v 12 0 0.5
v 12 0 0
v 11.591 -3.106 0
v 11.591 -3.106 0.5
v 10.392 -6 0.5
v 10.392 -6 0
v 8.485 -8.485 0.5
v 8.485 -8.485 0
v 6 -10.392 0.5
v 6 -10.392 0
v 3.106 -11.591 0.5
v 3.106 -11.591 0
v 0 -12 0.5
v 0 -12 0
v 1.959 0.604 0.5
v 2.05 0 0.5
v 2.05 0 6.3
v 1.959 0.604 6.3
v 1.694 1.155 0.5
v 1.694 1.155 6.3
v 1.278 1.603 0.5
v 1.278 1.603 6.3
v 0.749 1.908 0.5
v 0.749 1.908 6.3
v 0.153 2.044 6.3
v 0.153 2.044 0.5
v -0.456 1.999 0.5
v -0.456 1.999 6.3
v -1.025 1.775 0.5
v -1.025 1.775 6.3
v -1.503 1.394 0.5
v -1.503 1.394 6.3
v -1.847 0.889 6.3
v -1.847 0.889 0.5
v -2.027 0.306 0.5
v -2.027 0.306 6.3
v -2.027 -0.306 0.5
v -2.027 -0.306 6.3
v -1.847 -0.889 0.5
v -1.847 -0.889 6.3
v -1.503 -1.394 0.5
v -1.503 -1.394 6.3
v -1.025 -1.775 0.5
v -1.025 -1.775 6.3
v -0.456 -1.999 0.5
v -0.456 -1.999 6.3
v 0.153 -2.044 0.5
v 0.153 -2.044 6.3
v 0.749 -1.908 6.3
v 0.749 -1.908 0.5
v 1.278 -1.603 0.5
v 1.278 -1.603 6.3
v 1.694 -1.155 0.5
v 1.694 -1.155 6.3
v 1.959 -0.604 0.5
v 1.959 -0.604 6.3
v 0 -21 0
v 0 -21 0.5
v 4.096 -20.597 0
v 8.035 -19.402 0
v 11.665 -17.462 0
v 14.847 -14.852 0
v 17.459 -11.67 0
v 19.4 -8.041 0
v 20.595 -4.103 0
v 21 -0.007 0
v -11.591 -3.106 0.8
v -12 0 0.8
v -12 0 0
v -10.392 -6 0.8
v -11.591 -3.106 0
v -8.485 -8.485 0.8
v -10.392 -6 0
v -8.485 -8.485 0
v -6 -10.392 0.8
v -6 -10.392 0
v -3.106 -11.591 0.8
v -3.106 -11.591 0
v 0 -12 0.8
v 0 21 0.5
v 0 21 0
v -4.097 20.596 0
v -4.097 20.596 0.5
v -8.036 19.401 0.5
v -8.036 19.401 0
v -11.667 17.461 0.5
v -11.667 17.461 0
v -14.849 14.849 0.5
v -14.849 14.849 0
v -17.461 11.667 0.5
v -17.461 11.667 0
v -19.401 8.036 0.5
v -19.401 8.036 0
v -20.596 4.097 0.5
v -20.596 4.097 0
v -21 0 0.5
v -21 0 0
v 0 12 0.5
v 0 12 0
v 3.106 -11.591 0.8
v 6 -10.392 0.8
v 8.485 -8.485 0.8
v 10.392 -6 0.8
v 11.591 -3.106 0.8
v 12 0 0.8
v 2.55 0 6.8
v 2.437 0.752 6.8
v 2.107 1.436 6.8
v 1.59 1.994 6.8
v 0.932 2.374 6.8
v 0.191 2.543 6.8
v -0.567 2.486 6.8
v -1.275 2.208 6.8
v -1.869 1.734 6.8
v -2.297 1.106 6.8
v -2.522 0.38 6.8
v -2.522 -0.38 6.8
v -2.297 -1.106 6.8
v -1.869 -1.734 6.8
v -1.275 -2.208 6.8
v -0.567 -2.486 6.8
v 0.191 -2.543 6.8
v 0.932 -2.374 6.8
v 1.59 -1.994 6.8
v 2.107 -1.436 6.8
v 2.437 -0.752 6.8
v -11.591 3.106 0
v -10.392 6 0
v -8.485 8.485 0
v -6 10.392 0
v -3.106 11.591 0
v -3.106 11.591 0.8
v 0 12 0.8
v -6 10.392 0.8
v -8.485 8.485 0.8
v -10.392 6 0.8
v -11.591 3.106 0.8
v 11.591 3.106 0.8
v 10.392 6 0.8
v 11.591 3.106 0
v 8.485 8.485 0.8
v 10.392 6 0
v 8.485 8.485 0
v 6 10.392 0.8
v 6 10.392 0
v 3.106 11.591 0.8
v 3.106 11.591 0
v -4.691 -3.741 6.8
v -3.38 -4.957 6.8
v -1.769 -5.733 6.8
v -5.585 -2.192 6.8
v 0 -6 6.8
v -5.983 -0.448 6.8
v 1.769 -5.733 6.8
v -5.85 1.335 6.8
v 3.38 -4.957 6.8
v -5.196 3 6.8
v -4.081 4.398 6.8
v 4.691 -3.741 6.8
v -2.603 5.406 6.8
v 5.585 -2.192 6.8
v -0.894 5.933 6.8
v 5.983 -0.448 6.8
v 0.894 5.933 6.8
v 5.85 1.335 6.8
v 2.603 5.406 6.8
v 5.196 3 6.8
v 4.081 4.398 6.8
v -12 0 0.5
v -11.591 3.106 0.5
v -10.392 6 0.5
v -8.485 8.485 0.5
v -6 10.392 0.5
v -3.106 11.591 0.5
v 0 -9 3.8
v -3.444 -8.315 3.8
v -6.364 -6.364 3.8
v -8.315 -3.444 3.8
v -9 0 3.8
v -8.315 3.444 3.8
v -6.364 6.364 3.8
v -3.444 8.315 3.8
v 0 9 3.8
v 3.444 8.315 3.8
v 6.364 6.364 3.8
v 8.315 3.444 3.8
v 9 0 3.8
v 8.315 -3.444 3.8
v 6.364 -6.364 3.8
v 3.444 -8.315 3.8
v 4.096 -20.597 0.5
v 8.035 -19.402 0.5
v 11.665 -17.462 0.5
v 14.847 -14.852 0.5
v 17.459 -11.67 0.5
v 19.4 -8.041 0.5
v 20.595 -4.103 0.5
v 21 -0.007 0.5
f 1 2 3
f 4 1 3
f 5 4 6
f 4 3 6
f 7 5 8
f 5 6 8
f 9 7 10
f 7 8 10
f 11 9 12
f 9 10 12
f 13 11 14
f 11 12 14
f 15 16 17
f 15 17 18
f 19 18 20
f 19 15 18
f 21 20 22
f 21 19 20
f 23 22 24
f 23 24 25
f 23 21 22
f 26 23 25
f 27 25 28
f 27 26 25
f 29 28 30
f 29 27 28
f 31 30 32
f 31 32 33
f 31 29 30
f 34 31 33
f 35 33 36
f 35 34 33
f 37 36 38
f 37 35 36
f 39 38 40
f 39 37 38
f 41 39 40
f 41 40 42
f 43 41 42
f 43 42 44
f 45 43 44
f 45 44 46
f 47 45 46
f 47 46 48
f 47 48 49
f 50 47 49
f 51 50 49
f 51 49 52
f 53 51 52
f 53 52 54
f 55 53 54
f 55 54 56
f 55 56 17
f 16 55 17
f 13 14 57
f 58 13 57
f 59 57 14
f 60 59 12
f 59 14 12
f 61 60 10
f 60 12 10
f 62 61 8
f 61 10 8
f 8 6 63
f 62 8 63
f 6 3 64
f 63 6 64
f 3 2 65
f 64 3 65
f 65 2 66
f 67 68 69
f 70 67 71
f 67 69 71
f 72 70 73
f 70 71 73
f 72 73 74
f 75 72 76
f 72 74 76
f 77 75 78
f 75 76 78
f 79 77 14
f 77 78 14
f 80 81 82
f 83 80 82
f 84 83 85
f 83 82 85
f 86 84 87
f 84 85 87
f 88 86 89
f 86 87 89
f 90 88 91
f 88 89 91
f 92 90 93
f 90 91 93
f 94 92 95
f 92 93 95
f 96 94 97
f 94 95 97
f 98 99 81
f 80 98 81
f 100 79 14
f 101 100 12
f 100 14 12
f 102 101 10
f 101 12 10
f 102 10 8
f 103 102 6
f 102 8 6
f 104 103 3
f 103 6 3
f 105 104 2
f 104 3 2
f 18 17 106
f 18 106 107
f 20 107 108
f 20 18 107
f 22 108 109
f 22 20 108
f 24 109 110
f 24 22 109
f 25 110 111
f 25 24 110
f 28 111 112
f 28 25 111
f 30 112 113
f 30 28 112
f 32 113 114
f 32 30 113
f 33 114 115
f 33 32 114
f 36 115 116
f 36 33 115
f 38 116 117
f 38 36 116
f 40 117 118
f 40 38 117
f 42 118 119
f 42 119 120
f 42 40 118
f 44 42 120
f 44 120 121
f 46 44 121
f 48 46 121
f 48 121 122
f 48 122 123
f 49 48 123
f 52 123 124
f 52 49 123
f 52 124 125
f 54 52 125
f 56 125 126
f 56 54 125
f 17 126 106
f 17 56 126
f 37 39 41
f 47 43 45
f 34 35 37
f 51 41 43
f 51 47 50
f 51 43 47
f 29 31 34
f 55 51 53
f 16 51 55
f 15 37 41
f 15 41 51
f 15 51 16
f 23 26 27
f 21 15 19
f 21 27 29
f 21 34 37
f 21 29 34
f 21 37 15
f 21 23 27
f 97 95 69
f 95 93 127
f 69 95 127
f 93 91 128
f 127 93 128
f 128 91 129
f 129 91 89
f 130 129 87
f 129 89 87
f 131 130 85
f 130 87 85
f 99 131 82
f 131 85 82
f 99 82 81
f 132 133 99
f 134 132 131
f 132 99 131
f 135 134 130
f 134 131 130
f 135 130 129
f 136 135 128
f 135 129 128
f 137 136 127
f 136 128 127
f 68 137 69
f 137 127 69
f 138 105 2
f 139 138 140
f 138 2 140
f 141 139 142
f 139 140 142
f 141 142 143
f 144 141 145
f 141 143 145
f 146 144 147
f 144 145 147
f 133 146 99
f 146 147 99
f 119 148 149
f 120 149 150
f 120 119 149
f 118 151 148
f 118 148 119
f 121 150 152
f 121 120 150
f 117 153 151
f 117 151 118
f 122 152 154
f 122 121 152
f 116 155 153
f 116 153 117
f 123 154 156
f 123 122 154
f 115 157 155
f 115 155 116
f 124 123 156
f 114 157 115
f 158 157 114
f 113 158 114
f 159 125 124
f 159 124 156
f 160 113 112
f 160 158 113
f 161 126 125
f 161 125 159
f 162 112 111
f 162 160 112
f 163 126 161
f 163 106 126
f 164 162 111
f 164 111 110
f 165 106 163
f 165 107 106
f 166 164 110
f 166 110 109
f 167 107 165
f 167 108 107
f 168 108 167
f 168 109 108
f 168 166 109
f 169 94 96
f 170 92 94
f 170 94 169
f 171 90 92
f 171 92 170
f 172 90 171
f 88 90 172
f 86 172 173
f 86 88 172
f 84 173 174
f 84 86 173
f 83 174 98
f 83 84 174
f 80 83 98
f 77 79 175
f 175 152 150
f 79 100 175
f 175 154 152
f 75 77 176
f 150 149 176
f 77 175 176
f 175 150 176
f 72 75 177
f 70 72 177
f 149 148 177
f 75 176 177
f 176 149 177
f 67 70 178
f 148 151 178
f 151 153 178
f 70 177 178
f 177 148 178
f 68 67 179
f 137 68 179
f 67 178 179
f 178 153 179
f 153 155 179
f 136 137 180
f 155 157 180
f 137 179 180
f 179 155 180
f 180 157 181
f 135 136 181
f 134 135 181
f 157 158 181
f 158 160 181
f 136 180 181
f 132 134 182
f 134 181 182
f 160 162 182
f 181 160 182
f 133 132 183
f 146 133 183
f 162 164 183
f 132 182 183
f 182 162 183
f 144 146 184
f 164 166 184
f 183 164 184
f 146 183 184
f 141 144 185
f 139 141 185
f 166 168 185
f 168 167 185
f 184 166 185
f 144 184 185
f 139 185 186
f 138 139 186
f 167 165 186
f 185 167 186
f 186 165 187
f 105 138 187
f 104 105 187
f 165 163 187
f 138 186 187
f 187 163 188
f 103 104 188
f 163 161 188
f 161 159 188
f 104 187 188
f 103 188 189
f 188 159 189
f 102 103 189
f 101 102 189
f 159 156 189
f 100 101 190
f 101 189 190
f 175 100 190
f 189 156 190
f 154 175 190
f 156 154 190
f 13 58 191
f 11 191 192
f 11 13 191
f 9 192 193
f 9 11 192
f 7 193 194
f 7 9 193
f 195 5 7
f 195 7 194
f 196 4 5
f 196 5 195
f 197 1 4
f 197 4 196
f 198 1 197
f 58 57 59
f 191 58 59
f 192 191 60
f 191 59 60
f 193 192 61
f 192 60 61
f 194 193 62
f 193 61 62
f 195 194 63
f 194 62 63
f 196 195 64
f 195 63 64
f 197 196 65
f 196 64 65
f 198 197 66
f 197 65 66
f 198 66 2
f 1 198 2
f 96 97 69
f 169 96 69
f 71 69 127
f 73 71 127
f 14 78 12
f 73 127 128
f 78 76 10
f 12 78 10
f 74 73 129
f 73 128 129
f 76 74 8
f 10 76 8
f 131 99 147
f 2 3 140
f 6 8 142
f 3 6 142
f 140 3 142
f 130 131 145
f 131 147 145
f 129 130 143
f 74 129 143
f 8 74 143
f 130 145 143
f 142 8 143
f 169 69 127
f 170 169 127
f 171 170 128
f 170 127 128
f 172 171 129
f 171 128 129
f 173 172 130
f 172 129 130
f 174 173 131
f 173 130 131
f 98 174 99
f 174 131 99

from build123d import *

# Parameters (mm, degrees)
F0_R     = 2.05
F1_DEPTH = 0.5
F2_DEPTH = 6.8
F4_SIZE  = 0.5


# Not quite as in the source:
# - a fillet or chamfer that OpenCascade refuses, or shapes differently, is made with other operations: its cross-section is extruded or revolved along the edge and cut away or added


with BuildPart() as f1:
    # F0 (on Top) → F1 (new body)
    with BuildSketch(Plane.XY):
        Circle(F0_R)
    extrude(amount=F1_DEPTH)

    # F0 (on Top) → F2 (join)
    with BuildSketch(Plane.XY):
        with BuildLine():
            ThreePointArc((0, -12), (8.4852813742, -8.4852813742), (12, 0))
            ThreePointArc((12, 0), (8.4852813742, 8.4852813742), (0, 12))
            ThreePointArc((0, 12), (-8.4852813742, 8.4852813742), (-12, 0))
            ThreePointArc((-12, 0), (-8.4852813742, -8.4852813742), (0, -12))
        make_face()
        Circle(F0_R, mode=Mode.SUBTRACT)
    extrude(amount=F2_DEPTH)

    # F3: chamfer of 6 on 1 edges, made by hand

    # F3_s1 → F3_t2 (revolve, cut)
    with BuildSketch(Plane.YZ):
        Polygon((-12, 0.8), (-6, 6.8), (-12, 6.8), align=None)
    revolve(axis=Axis((0, 0, 6.8), (0, 0, -1)), mode=Mode.SUBTRACT)

    # F4
    f4_edges = [f1.edges().sort_by_distance(p)[0] for p in [
        (-2.05, 0, 6.8),
    ]]
    chamfer(f4_edges, length=F4_SIZE)


with BuildPart() as f1b:
    # F0 (on Top) → F1, piece 2 (new body)
    with BuildSketch(Plane.XY):
        with BuildLine():
            Line((20.9999989748, -0.0065618185), (12, 0))
            ThreePointArc((12, 0), (8.4852813742, -8.4852813742), (0, -12))
            Line((0, -12), (0, -21))
            ThreePointArc((0, -21), (14.8469222705, -14.8515621769), (20.9999989748, -0.0065618185))
        make_face()
    extrude(amount=F1_DEPTH)


with BuildPart() as f1c:
    # F0 (on Top) → F1, piece 3 (new body)
    with BuildSketch(Plane.XY):
        with BuildLine():
            ThreePointArc((-12, 0), (-8.4852813742, 8.4852813742), (0, 12))
            Line((0, 12), (0, 21))
            ThreePointArc((0, 21), (-14.8492424049, 14.8492424049), (-21, 0))
            Line((-21, 0), (-12, 0))
        make_face()
    extrude(amount=F1_DEPTH)


solid = Compound([f1.part, f1b.part, f1c.part])
